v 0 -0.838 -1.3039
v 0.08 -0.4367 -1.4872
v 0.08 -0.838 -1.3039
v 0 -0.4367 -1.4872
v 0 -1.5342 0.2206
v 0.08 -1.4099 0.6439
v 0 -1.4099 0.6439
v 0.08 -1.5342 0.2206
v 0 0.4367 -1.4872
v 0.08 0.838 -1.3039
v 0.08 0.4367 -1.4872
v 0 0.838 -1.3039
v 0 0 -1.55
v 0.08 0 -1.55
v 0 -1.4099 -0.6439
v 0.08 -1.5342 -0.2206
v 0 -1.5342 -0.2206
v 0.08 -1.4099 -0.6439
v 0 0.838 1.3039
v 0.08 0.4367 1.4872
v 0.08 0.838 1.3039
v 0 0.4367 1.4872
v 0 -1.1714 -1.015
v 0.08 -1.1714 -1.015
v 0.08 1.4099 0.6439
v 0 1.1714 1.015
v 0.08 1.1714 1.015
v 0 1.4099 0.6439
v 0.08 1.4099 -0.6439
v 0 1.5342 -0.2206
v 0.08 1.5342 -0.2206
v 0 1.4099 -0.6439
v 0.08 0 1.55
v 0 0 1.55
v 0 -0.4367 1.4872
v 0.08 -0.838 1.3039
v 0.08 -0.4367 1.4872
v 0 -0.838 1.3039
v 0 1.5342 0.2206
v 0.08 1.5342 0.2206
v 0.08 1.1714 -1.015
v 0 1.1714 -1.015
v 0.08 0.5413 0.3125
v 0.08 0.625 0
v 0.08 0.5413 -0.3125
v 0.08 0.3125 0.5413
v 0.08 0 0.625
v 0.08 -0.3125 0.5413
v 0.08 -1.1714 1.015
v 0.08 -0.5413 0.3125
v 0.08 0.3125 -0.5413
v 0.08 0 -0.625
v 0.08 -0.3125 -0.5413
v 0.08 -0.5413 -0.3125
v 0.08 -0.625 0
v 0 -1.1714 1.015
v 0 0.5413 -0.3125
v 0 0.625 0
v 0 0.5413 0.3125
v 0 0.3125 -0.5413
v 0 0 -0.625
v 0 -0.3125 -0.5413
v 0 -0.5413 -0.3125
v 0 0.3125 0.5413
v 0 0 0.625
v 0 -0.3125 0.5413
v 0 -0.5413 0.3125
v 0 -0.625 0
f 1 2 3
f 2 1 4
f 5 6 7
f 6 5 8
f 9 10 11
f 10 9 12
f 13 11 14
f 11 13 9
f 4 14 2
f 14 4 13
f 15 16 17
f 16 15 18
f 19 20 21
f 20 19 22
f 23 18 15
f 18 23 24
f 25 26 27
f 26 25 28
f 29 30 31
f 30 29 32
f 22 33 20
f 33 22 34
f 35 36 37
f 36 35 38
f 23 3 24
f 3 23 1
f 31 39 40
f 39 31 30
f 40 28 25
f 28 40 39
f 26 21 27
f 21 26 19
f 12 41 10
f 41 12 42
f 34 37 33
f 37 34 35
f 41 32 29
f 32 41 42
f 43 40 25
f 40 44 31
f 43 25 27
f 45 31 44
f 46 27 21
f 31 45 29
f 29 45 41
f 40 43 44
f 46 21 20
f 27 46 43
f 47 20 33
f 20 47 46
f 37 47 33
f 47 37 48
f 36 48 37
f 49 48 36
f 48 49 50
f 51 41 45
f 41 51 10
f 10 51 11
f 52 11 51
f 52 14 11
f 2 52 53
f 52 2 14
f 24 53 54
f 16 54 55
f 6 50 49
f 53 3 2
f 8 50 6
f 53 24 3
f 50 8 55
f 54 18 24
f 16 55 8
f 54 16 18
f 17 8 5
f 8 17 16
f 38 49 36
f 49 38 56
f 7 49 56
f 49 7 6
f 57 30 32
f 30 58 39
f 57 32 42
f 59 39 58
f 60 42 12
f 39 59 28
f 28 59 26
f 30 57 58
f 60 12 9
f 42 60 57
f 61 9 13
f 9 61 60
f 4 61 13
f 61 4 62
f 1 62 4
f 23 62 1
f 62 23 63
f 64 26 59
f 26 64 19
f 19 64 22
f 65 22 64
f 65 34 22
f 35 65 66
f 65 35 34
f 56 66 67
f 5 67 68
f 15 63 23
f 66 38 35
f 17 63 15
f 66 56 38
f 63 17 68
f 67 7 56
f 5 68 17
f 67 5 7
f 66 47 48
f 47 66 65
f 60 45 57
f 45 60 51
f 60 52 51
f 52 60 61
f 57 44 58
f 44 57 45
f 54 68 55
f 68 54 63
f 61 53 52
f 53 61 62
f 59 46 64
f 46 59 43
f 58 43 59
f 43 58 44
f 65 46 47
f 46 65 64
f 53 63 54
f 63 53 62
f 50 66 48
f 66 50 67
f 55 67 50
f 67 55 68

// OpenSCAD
module washer(rotation=0, thickness = 0.08) 
{
    diameter = 3.1;
    hole = 1.25;
    
    rotate([0,90,rotation]) 
    color([0.0,0.8,1.0])
    translate([0,0,thickness*0.5]) 
    {
        difference() {
            cylinder(h=thickness, r=diameter/2, $fn = 22, center=true);
            cylinder(h=thickness+0.1, r=hole/2, $fn = 12, center=true);
        }
    }
}

washer();
